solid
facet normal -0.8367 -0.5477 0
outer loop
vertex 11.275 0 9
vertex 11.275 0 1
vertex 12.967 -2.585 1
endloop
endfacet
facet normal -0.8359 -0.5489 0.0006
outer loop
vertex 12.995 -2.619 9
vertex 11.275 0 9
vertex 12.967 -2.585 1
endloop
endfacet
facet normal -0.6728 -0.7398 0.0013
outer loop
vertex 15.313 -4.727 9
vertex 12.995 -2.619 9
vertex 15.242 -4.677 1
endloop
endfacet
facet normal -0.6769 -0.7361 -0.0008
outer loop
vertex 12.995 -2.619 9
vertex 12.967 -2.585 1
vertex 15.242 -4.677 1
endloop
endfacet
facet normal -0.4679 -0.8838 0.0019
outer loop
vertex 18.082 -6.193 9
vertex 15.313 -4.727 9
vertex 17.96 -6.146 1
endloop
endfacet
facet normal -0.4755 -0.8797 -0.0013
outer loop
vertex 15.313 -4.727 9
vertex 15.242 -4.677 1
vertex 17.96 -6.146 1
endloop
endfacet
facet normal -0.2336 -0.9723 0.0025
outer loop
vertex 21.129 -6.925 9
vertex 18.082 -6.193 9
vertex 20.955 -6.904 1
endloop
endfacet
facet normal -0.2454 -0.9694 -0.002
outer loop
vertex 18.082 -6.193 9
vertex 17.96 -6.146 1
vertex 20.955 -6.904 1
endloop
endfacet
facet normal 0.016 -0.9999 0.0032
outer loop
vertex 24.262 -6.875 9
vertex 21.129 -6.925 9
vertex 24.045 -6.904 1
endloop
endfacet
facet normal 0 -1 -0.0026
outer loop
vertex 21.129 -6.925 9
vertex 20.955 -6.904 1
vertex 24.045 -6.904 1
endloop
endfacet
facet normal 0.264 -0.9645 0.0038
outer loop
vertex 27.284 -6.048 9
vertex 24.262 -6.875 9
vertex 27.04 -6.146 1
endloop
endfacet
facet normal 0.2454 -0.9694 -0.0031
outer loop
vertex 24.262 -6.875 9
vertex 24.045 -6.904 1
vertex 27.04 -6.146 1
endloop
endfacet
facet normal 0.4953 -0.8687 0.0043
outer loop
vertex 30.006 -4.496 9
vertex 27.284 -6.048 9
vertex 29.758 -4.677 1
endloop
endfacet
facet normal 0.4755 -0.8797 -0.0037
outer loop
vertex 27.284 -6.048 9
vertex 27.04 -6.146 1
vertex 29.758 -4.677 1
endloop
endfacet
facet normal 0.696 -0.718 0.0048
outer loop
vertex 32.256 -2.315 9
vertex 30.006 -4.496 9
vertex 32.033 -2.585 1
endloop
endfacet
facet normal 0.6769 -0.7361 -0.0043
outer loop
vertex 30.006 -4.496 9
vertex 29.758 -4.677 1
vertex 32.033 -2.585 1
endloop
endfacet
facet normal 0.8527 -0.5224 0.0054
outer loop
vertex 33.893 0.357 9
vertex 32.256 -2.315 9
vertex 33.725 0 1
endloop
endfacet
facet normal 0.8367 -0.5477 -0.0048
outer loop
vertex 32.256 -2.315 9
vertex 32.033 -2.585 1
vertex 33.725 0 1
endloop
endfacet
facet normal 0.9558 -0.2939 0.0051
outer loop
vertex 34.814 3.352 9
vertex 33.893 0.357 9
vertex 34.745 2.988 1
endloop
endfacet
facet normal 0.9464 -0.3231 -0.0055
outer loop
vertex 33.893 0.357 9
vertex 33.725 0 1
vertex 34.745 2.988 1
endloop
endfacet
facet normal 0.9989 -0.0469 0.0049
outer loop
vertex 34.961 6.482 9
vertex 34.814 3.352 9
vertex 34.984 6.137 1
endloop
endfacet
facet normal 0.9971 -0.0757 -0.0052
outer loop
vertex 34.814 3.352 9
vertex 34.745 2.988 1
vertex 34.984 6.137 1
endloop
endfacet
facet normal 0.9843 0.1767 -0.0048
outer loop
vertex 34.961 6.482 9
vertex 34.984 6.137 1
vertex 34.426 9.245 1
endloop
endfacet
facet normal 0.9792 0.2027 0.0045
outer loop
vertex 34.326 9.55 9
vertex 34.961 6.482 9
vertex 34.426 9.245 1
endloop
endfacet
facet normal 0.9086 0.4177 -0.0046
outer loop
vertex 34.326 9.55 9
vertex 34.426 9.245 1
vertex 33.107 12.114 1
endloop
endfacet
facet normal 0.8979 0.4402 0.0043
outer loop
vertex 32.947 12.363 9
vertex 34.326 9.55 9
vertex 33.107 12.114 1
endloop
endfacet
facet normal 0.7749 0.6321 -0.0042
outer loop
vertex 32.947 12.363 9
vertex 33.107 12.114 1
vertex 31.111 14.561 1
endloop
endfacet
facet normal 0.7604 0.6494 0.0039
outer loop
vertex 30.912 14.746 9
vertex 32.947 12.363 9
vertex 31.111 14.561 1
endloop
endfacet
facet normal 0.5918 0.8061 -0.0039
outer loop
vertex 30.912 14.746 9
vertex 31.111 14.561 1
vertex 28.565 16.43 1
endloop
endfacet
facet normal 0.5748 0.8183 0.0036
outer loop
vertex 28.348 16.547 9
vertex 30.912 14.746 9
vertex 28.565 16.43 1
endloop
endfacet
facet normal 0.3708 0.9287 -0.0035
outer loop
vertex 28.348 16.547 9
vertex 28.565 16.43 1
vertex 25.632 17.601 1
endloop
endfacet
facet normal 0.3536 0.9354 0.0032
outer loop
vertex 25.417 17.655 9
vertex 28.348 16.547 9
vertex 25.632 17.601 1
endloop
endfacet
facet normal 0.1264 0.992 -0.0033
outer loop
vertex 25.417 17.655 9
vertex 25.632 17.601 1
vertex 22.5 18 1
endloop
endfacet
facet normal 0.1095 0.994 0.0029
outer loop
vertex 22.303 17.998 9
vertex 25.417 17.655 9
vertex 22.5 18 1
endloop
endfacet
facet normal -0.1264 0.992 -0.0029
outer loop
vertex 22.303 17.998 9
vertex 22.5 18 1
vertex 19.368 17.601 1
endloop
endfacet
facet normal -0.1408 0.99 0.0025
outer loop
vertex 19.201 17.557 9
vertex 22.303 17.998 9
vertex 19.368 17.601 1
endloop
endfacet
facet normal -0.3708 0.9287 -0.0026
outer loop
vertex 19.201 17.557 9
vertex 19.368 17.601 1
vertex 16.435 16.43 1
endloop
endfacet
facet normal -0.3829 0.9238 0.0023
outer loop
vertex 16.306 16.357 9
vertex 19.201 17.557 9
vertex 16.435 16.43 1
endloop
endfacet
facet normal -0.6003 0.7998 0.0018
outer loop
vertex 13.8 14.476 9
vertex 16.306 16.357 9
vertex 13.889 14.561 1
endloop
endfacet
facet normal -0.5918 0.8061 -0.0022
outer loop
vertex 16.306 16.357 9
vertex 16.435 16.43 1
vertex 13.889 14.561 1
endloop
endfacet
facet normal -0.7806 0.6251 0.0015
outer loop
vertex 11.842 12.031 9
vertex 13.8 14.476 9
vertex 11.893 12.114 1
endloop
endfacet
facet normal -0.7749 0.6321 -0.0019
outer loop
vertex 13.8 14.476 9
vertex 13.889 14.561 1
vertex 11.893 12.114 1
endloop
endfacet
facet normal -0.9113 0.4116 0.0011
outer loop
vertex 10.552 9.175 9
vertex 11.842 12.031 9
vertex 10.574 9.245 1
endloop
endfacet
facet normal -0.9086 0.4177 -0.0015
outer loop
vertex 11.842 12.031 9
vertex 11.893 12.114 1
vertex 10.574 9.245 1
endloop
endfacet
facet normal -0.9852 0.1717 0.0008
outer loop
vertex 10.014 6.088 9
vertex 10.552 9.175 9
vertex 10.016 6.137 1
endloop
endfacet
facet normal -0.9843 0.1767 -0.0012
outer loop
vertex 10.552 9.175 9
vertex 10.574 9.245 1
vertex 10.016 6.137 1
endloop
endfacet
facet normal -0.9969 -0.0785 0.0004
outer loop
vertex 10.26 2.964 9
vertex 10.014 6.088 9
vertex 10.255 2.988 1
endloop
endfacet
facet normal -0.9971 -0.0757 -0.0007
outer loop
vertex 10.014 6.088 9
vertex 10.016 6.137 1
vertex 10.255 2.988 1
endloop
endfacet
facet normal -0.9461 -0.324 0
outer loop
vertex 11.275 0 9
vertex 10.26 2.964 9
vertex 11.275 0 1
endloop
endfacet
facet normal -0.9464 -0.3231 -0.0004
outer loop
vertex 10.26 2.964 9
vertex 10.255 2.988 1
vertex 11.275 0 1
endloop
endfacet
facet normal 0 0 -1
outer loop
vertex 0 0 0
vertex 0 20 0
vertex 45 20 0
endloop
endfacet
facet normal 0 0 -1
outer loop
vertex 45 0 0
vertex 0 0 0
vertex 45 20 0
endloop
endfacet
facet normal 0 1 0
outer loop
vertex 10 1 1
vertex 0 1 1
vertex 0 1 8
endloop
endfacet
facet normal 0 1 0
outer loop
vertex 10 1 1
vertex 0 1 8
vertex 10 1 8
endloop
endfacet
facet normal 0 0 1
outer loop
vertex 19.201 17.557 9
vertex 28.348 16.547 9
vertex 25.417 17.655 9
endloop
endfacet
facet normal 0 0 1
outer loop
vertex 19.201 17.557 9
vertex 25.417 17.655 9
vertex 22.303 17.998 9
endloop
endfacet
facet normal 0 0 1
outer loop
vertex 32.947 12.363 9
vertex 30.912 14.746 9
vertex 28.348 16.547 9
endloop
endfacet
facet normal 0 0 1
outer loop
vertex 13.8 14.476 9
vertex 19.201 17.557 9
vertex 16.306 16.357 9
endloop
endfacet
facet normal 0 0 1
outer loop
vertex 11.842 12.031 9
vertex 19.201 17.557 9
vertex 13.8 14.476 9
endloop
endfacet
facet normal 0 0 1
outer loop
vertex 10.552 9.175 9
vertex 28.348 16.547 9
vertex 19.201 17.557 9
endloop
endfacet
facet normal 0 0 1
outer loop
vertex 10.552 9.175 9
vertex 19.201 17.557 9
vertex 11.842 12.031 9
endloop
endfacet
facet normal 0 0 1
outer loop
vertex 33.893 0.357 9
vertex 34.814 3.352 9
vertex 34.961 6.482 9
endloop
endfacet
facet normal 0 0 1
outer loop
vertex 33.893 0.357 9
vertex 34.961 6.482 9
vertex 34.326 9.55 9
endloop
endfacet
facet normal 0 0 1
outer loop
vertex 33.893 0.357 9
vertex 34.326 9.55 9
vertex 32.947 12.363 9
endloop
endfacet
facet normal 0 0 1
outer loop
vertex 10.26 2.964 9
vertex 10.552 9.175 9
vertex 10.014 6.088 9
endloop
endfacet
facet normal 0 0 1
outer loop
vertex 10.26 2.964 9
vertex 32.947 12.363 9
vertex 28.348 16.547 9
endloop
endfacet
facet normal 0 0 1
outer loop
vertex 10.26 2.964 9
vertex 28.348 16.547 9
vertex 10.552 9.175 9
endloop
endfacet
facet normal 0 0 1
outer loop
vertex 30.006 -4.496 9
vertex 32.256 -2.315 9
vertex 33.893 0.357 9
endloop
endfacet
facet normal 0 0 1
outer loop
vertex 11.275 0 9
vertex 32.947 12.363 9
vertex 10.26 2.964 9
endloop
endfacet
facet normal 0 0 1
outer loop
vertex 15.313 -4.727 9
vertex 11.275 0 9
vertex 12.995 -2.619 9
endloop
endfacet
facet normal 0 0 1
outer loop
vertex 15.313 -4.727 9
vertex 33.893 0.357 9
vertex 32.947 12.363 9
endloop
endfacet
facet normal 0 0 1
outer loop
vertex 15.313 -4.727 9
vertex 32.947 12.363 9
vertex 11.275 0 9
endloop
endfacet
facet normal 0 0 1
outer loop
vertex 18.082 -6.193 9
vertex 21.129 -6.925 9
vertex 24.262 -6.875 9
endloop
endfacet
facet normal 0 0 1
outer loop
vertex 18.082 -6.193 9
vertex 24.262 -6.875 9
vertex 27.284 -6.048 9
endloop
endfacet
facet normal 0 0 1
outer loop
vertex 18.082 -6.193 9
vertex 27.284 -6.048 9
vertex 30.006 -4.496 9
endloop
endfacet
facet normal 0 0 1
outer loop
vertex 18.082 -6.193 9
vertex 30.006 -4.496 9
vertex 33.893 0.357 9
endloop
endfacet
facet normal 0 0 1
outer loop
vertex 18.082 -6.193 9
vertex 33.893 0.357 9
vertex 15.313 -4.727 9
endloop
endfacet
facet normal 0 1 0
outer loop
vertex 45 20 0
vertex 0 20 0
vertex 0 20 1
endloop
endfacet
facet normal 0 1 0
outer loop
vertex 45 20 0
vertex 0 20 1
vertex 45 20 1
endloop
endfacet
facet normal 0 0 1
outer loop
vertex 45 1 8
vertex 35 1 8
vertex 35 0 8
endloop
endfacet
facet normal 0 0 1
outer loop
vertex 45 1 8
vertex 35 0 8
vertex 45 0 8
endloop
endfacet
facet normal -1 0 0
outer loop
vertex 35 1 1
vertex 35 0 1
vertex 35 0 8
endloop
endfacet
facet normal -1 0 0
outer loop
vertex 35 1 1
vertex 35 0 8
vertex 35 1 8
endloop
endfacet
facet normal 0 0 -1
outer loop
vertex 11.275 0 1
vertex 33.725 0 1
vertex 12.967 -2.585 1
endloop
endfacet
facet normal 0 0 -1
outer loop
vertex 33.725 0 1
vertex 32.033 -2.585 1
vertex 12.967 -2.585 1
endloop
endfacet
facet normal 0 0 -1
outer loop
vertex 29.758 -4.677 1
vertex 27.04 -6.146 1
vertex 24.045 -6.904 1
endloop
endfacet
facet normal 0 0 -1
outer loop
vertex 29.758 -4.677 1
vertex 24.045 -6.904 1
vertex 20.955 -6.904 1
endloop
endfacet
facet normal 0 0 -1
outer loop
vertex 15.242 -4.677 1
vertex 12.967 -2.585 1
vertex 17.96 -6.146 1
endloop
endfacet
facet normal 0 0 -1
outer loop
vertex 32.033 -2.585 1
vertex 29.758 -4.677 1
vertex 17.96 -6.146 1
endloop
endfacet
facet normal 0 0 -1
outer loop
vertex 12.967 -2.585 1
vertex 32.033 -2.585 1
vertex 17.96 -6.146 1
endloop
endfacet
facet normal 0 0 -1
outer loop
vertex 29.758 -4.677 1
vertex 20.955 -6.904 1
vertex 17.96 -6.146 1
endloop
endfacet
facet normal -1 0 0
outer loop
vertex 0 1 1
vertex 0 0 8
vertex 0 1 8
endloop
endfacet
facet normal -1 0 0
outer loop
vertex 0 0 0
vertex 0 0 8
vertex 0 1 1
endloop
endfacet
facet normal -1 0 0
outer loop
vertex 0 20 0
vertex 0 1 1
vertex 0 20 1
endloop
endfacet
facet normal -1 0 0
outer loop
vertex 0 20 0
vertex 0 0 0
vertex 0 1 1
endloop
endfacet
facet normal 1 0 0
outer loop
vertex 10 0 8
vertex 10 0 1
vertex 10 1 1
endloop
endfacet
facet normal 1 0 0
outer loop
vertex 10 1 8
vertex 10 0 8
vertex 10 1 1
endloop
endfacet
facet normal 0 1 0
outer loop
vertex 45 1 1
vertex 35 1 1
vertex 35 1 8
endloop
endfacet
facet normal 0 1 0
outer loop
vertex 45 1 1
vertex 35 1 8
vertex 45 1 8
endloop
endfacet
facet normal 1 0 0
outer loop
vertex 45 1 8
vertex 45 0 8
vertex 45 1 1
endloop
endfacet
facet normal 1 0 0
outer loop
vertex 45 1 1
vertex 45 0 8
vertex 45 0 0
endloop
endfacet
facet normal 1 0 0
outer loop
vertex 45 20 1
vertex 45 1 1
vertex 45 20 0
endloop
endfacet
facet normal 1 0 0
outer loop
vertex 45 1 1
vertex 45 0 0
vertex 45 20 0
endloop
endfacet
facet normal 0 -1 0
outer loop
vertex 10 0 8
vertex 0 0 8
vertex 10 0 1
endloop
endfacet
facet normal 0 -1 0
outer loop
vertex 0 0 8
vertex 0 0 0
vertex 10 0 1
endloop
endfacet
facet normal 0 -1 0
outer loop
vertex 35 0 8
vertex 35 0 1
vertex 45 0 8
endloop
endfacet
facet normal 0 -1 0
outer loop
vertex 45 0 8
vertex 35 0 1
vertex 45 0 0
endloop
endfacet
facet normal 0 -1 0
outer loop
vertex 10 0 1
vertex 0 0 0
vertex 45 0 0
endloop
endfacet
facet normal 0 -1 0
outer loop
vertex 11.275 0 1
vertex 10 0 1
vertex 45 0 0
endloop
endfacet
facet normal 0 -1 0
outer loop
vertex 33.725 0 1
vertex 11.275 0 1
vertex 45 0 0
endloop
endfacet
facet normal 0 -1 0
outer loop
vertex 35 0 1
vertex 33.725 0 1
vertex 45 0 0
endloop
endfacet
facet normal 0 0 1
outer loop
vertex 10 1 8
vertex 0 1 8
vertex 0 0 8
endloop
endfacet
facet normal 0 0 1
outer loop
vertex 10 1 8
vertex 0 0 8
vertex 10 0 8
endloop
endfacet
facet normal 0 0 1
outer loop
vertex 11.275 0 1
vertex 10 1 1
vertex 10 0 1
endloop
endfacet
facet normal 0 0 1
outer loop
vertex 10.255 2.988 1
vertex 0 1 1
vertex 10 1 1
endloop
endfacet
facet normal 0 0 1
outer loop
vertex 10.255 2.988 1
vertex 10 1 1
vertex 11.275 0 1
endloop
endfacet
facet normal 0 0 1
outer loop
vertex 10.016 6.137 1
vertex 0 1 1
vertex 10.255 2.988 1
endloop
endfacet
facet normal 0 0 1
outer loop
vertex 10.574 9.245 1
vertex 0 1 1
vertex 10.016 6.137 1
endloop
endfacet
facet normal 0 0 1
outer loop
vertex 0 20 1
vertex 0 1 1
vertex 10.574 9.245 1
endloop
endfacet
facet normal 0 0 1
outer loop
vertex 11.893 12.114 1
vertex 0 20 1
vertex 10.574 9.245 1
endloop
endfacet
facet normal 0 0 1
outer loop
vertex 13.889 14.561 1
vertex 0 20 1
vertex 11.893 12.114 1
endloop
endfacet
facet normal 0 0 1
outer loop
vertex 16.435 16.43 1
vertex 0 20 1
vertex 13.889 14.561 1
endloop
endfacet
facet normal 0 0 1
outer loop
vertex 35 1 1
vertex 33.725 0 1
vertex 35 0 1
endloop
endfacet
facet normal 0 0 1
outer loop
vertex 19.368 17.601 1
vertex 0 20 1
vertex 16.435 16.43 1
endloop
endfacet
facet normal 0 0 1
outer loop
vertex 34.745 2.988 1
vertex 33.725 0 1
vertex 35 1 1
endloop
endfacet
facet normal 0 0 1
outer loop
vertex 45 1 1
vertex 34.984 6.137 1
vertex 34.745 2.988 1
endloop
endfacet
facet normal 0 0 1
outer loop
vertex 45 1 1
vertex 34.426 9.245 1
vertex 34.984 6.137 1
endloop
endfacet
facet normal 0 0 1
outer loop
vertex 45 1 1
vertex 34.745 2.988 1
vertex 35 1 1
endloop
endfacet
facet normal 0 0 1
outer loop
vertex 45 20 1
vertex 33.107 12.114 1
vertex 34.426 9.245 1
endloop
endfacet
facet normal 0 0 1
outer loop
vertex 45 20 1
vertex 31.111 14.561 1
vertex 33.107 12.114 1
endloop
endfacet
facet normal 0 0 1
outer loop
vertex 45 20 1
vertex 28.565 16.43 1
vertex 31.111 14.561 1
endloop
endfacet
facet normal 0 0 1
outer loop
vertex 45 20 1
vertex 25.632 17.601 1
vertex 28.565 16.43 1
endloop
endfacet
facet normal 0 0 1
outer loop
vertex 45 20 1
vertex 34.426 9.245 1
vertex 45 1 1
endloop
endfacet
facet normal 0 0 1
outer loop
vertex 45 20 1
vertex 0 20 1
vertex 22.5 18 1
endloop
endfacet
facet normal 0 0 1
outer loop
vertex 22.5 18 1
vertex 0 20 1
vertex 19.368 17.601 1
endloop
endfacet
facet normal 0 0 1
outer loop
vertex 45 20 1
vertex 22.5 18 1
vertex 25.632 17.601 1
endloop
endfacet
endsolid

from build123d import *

# Parameters (mm, degrees)
SKETCH2_W           = 45
SKETCH2_H           = 20
BOSS_EXTRUDE1_DEPTH = 1
SKETCH3_R           = 12.5
BOSS_EXTRUDE4_DEPTH = 8
SKETCH6_W           = 10
SKETCH6_H           = 1
BOSS_EXTRUDE5_DEPTH = 7


with BuildPart() as part:
    # Sketch2 → Boss-Extrude1 (new body)
    with BuildSketch(Plane.XY):
        with Locations((22.5, 10)):
            Rectangle(SKETCH2_W, SKETCH2_H)
    extrude(amount=BOSS_EXTRUDE1_DEPTH)

    # Sketch3 → Boss-Extrude4 (add)
    with BuildSketch(Plane.XY.offset(1)):
        with Locations(Location((22.5, 5.5, 0), (0, 0, 206.103881137))):
            Circle(SKETCH3_R)
    extrude(amount=BOSS_EXTRUDE4_DEPTH)

    # Sketch6 → Boss-Extrude5 (add)
    with BuildSketch(Plane.XY.offset(1)):
        with Locations((5, 0.5)):
            Rectangle(SKETCH6_W, SKETCH6_H)
        with Locations((40, 0.5)):
            Rectangle(SKETCH6_W, SKETCH6_H)
    extrude(amount=BOSS_EXTRUDE5_DEPTH)


solid = part.part
